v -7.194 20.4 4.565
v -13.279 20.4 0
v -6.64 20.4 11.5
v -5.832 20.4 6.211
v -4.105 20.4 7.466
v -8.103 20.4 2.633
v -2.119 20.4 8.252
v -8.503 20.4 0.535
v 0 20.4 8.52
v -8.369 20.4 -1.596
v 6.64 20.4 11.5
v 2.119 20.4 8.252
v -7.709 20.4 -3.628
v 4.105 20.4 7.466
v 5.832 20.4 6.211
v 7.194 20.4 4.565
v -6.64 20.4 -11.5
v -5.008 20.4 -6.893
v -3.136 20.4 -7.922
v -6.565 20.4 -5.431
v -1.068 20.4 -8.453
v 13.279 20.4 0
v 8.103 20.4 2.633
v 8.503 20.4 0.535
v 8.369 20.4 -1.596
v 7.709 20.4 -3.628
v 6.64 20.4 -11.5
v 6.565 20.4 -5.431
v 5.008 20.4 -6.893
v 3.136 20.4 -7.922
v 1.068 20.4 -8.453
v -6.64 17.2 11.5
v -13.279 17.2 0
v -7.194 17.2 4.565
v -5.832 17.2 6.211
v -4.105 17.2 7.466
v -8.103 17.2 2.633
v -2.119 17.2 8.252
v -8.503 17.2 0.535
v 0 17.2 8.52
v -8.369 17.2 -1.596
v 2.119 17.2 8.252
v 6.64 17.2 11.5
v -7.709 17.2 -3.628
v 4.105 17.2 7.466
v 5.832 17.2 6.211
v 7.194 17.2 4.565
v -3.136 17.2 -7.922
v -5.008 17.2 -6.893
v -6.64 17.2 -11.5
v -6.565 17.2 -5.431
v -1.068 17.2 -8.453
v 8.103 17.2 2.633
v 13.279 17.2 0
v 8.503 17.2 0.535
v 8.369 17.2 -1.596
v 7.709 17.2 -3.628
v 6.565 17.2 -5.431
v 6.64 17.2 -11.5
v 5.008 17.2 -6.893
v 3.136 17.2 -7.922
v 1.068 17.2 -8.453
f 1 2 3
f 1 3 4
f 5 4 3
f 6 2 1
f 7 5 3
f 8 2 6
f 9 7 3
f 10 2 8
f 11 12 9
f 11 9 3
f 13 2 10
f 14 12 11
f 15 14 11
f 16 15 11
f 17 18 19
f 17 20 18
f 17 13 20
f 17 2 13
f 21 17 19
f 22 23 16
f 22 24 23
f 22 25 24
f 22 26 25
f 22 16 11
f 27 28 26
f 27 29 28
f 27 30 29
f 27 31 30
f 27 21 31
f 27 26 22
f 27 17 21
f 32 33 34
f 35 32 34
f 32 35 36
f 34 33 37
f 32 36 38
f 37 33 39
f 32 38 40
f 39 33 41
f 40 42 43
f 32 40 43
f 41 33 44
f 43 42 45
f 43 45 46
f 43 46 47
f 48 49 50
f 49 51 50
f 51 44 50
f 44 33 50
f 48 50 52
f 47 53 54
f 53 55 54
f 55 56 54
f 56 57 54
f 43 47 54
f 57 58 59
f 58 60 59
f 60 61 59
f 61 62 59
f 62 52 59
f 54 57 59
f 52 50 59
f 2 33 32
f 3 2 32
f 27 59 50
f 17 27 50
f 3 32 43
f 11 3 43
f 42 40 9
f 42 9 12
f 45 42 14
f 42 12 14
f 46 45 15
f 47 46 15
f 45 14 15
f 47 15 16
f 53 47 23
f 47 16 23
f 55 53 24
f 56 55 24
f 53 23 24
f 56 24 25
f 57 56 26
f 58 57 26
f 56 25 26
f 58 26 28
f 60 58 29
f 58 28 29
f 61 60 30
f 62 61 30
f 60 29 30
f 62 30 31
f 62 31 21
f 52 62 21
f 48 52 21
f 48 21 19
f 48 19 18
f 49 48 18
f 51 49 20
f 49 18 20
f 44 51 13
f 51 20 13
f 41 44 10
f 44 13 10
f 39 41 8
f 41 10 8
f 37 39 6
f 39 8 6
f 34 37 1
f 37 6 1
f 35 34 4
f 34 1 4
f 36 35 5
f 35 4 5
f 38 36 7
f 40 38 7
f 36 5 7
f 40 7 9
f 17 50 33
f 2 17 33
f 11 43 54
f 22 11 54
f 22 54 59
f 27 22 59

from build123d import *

# Parameters (mm, degrees)
NUT_DEPTH     = 3.2
BORE_SKETCH_W = 8.52
BORE_SKETCH_H = 5.2


with BuildPart() as part:
    # Nut Sketch → Nut (new body)
    with BuildSketch(Plane(origin=(0, 17.2, 0), x_dir=(1, 0, 0), z_dir=(0, 1, 0))):
        Polygon((13.279056191, 0), (6.639528096, 11.5), (-6.639528096, 11.5), (-13.279056191, 0), (-6.639528096, -11.5), (6.639528096, -11.5), align=None)
    extrude(amount=NUT_DEPTH)

    # Bore Sketch → Bore (revolve, cut)
    with BuildSketch(Plane.XY):
        with Locations((4.26, 18.8)):
            Rectangle(BORE_SKETCH_W, BORE_SKETCH_H)
    revolve(axis=Axis((0, -100, 0), (0, 1, 0)), mode=Mode.SUBTRACT)


solid = part.part
